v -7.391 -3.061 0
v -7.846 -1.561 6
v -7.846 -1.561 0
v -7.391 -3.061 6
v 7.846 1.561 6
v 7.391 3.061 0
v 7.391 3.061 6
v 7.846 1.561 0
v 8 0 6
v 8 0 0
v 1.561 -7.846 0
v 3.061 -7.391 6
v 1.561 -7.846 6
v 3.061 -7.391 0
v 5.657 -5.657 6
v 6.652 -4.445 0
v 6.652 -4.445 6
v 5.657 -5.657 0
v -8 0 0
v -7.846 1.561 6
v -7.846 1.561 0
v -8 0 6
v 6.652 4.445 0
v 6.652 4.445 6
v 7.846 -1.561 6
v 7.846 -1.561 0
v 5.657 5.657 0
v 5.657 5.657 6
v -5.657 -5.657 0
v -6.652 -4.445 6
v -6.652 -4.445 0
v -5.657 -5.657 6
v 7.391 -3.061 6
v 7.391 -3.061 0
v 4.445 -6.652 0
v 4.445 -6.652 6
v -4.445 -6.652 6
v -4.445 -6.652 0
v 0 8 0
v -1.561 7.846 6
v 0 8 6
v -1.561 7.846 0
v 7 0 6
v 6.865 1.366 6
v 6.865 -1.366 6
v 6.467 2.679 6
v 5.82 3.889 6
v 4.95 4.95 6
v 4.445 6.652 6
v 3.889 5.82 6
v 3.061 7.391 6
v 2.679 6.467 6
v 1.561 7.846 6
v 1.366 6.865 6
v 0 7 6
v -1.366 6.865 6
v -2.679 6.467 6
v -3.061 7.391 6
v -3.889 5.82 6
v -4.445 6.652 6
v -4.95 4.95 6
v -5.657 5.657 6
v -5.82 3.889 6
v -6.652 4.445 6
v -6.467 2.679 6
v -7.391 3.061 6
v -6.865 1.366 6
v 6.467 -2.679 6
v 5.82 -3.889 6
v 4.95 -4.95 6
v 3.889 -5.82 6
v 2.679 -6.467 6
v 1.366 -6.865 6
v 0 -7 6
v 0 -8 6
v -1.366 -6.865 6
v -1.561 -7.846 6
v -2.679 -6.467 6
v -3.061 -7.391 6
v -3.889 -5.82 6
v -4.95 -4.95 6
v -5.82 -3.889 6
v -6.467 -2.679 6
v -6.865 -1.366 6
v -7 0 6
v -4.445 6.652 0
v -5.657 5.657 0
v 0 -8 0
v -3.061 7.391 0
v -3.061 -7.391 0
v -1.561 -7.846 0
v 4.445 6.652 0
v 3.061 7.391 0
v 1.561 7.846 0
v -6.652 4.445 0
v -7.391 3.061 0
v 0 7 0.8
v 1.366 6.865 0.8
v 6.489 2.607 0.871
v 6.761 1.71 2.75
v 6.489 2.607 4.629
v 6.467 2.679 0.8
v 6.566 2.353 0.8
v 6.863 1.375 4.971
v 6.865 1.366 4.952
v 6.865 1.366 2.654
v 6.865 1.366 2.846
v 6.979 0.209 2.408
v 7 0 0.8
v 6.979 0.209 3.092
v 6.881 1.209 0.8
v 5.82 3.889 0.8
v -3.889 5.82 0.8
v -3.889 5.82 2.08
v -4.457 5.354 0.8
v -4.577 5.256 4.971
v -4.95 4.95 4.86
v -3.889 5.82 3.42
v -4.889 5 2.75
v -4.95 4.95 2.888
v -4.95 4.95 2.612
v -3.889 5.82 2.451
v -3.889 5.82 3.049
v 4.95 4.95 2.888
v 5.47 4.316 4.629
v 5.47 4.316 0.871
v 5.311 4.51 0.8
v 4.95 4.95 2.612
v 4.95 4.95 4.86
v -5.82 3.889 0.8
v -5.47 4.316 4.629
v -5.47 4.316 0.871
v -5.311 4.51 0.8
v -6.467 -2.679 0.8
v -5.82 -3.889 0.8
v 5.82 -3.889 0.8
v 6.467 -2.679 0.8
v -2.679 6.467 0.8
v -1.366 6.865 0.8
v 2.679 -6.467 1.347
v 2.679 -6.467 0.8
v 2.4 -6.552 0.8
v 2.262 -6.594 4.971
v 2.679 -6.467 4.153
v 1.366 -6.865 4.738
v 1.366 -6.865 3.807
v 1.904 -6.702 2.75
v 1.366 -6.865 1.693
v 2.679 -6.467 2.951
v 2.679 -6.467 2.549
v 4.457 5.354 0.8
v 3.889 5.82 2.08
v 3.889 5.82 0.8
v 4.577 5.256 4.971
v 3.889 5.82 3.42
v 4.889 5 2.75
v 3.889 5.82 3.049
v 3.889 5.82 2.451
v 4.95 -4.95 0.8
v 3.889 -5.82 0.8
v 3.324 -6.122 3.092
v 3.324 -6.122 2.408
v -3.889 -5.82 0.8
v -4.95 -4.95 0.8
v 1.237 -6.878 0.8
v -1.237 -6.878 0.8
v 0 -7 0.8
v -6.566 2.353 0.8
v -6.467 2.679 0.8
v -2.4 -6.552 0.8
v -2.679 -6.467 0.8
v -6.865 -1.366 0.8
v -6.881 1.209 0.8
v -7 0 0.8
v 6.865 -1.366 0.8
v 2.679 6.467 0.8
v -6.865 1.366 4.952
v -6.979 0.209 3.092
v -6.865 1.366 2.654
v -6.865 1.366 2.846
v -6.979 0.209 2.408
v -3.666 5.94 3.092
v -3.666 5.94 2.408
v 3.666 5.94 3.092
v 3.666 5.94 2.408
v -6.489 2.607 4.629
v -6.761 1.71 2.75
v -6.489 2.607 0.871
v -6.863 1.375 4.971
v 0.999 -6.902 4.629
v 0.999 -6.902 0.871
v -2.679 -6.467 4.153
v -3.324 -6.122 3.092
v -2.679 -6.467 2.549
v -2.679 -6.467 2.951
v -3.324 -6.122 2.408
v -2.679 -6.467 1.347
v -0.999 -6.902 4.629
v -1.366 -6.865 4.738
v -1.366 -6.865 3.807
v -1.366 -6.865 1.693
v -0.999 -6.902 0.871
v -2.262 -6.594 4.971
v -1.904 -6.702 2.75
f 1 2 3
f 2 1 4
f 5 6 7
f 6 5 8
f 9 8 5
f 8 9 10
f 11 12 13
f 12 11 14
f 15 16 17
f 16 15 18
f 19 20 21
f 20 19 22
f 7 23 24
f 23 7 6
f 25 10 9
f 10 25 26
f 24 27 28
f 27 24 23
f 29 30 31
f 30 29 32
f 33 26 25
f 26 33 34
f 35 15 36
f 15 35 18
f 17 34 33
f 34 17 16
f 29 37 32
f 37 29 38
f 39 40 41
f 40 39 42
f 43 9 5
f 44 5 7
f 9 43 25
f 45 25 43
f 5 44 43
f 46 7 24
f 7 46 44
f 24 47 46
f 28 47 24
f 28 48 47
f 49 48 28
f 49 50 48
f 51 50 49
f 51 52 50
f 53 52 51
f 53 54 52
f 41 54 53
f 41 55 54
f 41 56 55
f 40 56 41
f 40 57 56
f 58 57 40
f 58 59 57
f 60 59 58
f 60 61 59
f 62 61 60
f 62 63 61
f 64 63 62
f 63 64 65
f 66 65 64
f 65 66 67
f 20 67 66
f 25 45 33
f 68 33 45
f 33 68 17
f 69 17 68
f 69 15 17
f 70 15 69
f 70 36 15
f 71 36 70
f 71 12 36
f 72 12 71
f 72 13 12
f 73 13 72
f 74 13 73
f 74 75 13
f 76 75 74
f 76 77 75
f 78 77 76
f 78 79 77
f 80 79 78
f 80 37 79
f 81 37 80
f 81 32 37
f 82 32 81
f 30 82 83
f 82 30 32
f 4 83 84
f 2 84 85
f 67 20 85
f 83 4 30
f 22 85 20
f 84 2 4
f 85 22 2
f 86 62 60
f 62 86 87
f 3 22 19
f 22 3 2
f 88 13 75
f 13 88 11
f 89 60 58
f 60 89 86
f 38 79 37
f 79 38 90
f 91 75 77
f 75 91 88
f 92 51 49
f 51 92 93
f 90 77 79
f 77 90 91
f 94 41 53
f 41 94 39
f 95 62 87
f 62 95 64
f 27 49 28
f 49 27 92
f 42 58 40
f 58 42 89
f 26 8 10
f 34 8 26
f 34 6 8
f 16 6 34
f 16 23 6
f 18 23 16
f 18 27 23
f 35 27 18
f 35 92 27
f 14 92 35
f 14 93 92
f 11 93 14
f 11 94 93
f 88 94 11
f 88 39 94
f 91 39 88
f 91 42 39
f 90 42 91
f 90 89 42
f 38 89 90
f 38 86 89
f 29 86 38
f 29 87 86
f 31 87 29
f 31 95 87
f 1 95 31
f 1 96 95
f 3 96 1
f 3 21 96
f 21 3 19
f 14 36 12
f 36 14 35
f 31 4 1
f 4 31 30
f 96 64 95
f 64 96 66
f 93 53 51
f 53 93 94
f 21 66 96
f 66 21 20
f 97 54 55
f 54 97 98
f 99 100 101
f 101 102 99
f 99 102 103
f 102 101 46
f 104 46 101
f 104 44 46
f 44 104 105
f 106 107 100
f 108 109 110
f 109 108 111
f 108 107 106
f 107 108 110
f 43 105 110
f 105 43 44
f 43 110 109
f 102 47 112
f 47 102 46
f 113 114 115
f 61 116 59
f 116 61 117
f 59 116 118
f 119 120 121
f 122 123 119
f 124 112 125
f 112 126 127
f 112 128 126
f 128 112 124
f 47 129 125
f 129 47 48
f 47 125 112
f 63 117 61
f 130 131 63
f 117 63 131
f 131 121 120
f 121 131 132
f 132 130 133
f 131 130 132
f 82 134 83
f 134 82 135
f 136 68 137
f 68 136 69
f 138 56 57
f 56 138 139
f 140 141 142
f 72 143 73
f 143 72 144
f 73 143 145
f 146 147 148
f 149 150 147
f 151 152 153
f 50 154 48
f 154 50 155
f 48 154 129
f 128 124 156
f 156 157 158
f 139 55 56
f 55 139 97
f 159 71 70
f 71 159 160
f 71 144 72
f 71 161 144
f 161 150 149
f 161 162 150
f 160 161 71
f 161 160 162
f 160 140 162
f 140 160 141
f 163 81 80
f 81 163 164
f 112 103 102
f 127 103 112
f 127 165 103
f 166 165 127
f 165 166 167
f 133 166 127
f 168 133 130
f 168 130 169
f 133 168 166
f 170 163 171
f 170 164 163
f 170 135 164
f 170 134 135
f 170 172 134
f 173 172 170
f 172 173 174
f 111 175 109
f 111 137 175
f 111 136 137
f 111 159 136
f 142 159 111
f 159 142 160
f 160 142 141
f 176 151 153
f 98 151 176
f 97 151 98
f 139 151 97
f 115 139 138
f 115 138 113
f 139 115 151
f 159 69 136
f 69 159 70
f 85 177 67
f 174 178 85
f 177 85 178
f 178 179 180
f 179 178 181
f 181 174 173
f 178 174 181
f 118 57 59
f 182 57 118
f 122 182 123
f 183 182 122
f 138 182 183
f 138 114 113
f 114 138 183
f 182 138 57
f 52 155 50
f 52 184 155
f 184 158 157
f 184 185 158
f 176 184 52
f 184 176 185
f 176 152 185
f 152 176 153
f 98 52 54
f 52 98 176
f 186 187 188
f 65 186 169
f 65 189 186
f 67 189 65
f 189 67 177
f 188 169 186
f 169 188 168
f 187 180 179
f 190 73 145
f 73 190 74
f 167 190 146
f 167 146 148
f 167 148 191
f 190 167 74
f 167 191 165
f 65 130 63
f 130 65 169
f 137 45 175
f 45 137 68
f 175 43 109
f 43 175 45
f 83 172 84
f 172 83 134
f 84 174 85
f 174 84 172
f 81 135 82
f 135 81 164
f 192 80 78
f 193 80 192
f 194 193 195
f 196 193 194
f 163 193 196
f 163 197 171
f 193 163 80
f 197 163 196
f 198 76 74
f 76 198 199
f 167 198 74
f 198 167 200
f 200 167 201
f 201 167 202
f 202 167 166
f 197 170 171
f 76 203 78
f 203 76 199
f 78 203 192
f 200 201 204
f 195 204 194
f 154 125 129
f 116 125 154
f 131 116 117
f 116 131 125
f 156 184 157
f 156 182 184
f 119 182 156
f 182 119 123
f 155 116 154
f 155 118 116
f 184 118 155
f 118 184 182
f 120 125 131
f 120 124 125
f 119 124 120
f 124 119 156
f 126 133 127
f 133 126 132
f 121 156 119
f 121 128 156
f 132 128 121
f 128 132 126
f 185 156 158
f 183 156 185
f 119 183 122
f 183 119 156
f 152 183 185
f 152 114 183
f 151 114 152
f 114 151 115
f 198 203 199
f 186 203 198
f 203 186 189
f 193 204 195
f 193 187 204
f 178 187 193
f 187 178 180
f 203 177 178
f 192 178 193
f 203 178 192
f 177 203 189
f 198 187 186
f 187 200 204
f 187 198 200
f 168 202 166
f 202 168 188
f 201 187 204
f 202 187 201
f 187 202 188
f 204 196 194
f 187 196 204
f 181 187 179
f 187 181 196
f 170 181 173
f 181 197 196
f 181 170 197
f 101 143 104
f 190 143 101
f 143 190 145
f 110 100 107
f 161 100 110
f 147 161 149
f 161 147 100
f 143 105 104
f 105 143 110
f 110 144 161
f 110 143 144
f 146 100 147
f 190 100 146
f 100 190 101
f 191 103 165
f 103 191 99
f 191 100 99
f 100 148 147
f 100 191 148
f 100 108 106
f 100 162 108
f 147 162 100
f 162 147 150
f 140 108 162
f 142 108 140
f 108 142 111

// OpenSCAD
use <utilities.scad>;

$fn=32;

tube_lens_r=5;
tube_lens_edge_h=2;
gripper_t=1;

union(){
    difference(){
        cylinder(r=8,h=6);
        translate([0,0,0.8]) cylinder(r=7,h=999);
    }
    intersection(){
        cylinder(r=7.5,h=999);
        for(a=[0,120,240]) rotate(a){
            translate([-999,tube_lens_r,tube_lens_edge_h+0.75]) reflect([0,0,1]) rotate([20,0,0]) cube([999*2,gripper_t,tube_lens_edge_h]);
        }
    }
}

%cylinder(r=5,h=6);
